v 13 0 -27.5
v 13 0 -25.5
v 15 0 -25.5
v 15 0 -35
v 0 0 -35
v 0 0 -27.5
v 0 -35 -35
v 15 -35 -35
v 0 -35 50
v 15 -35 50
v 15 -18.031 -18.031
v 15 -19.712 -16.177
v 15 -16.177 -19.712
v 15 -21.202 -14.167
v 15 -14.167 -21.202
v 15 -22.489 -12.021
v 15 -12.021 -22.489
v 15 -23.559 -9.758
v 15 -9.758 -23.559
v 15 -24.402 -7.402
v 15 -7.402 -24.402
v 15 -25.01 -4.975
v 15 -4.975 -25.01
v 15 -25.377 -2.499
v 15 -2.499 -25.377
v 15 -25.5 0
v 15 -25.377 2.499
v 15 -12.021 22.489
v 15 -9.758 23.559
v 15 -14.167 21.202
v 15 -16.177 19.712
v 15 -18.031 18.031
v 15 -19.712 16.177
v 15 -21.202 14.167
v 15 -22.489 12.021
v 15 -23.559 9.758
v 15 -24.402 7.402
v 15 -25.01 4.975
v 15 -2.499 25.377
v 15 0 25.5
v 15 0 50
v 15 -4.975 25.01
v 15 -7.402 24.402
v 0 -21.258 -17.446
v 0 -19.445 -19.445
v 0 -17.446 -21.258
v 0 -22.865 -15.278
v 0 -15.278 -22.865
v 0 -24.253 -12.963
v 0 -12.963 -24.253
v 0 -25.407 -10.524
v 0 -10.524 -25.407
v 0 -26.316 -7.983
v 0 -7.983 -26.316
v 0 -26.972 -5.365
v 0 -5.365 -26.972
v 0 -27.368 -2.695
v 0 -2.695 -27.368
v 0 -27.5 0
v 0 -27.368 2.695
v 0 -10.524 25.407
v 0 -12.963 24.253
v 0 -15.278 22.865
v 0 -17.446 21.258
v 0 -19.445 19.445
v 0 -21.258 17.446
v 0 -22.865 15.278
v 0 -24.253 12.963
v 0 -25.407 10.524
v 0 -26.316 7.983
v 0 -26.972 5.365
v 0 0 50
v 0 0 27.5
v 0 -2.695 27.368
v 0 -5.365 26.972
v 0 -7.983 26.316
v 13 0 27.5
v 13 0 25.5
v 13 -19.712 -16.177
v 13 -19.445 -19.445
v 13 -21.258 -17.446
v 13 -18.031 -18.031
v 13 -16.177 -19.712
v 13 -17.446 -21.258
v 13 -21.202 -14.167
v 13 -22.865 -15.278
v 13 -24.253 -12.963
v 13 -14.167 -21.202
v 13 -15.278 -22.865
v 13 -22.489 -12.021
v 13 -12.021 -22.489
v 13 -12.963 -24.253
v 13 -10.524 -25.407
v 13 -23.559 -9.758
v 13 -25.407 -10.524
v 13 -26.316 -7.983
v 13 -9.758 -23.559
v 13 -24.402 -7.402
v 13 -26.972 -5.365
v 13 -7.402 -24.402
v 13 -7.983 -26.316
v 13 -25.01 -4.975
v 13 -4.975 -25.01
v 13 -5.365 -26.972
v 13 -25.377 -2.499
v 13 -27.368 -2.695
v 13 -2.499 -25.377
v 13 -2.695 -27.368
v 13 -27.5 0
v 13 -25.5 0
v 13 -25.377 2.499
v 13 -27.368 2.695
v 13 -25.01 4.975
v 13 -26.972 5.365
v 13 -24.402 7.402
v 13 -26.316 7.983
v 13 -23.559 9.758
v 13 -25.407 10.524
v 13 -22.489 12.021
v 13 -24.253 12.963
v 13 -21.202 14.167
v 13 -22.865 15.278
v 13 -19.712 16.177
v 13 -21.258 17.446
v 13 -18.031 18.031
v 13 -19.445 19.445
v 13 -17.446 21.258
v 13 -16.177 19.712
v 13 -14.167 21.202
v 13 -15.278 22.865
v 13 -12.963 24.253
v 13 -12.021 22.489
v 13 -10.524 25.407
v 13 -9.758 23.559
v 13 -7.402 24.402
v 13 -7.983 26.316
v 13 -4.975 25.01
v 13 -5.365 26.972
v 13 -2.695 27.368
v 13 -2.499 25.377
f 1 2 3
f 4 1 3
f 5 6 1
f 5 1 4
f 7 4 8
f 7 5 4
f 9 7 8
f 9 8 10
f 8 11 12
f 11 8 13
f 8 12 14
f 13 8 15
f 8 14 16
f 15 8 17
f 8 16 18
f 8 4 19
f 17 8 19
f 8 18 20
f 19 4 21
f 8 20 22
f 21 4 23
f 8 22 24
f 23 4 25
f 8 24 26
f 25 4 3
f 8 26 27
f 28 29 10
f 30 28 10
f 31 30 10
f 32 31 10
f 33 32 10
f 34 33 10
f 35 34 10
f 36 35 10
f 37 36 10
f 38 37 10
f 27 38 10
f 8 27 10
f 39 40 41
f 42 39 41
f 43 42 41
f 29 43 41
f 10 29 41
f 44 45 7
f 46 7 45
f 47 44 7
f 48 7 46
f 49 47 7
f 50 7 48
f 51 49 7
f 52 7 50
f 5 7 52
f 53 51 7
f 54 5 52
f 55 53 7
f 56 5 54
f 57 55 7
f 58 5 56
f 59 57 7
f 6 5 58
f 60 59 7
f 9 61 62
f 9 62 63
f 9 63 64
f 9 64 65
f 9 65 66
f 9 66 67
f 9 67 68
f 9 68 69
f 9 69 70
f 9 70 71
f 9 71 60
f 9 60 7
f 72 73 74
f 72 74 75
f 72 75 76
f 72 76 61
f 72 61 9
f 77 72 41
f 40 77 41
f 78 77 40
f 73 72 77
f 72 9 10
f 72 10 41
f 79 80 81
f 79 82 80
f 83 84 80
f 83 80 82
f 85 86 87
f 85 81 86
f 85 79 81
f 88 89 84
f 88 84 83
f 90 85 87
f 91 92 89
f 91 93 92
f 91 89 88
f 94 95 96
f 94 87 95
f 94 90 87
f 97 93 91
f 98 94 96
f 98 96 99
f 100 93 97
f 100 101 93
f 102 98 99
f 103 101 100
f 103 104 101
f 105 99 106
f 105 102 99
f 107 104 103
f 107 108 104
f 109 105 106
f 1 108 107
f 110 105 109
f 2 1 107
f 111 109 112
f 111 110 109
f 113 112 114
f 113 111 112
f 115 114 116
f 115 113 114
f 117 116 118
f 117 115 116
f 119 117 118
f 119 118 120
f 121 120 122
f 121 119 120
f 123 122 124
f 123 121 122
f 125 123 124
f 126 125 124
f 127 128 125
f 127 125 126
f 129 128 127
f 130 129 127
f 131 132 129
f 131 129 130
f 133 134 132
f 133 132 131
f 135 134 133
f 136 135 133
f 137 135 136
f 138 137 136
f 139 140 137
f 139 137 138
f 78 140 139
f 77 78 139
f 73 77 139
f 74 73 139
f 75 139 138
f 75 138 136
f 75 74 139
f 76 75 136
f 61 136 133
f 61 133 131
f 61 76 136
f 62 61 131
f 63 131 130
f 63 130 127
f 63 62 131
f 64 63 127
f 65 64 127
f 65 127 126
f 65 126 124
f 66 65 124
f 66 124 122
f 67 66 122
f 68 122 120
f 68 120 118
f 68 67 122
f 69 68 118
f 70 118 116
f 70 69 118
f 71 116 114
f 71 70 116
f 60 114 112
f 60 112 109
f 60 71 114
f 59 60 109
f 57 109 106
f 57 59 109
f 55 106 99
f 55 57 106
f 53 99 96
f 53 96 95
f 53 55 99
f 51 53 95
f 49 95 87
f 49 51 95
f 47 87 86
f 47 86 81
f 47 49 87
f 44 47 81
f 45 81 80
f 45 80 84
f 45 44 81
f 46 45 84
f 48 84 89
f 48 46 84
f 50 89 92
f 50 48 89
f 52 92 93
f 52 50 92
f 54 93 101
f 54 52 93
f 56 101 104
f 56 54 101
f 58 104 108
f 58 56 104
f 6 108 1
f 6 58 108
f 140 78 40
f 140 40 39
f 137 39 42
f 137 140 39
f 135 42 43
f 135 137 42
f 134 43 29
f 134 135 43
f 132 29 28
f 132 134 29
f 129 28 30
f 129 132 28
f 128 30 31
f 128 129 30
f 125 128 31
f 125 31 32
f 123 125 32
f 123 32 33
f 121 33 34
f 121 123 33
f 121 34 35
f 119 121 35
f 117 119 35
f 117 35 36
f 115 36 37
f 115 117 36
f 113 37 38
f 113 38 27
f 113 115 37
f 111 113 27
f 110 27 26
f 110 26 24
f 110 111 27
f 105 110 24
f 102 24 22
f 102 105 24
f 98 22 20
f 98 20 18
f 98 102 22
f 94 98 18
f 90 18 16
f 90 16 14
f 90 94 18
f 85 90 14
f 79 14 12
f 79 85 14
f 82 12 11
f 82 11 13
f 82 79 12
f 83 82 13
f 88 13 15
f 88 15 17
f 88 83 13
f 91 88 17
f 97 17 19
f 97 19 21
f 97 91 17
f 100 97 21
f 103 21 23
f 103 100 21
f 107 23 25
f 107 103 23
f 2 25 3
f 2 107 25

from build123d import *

# Parameters (mm, degrees)
BOSS_EXTRUDE1_DEPTH = 13
BOSS_EXTRUDE4_DEPTH = 2


with BuildPart() as part:
    # Sketch1 → Boss-Extrude1 (new body)
    with BuildSketch(Plane(origin=(0, 0, 0), x_dir=(0, 0, -1), z_dir=(1, 0, 0))):
        with BuildLine():
            Line((-50, 0), (-27.5, 0))
            ThreePointArc((-27.5, 0), (0, -27.5), (27.5, 0))
            Line((27.5, 0), (35, 0))
            Line((35, 0), (35, -35))
            Line((35, -35), (-50, -35))
            Line((-50, -35), (-50, 0))
        make_face()
    extrude(amount=BOSS_EXTRUDE1_DEPTH)

    # Sketch4 → Boss-Extrude4 (add)
    with BuildSketch(Plane(origin=(13, 0, 0), x_dir=(0, 0, -1), z_dir=(1, 0, 0))):
        with BuildLine():
            Line((35, 0), (35, -35))
            Line((35, -35), (-50, -35))
            Line((-50, -35), (-50, 0))
            Line((-50, 0), (-25.5, 0))
            ThreePointArc((-25.5, 0), (0, -25.5), (25.5, 0))
            Line((25.5, 0), (35, 0))
        make_face()
    extrude(amount=BOSS_EXTRUDE4_DEPTH)


solid = part.part
